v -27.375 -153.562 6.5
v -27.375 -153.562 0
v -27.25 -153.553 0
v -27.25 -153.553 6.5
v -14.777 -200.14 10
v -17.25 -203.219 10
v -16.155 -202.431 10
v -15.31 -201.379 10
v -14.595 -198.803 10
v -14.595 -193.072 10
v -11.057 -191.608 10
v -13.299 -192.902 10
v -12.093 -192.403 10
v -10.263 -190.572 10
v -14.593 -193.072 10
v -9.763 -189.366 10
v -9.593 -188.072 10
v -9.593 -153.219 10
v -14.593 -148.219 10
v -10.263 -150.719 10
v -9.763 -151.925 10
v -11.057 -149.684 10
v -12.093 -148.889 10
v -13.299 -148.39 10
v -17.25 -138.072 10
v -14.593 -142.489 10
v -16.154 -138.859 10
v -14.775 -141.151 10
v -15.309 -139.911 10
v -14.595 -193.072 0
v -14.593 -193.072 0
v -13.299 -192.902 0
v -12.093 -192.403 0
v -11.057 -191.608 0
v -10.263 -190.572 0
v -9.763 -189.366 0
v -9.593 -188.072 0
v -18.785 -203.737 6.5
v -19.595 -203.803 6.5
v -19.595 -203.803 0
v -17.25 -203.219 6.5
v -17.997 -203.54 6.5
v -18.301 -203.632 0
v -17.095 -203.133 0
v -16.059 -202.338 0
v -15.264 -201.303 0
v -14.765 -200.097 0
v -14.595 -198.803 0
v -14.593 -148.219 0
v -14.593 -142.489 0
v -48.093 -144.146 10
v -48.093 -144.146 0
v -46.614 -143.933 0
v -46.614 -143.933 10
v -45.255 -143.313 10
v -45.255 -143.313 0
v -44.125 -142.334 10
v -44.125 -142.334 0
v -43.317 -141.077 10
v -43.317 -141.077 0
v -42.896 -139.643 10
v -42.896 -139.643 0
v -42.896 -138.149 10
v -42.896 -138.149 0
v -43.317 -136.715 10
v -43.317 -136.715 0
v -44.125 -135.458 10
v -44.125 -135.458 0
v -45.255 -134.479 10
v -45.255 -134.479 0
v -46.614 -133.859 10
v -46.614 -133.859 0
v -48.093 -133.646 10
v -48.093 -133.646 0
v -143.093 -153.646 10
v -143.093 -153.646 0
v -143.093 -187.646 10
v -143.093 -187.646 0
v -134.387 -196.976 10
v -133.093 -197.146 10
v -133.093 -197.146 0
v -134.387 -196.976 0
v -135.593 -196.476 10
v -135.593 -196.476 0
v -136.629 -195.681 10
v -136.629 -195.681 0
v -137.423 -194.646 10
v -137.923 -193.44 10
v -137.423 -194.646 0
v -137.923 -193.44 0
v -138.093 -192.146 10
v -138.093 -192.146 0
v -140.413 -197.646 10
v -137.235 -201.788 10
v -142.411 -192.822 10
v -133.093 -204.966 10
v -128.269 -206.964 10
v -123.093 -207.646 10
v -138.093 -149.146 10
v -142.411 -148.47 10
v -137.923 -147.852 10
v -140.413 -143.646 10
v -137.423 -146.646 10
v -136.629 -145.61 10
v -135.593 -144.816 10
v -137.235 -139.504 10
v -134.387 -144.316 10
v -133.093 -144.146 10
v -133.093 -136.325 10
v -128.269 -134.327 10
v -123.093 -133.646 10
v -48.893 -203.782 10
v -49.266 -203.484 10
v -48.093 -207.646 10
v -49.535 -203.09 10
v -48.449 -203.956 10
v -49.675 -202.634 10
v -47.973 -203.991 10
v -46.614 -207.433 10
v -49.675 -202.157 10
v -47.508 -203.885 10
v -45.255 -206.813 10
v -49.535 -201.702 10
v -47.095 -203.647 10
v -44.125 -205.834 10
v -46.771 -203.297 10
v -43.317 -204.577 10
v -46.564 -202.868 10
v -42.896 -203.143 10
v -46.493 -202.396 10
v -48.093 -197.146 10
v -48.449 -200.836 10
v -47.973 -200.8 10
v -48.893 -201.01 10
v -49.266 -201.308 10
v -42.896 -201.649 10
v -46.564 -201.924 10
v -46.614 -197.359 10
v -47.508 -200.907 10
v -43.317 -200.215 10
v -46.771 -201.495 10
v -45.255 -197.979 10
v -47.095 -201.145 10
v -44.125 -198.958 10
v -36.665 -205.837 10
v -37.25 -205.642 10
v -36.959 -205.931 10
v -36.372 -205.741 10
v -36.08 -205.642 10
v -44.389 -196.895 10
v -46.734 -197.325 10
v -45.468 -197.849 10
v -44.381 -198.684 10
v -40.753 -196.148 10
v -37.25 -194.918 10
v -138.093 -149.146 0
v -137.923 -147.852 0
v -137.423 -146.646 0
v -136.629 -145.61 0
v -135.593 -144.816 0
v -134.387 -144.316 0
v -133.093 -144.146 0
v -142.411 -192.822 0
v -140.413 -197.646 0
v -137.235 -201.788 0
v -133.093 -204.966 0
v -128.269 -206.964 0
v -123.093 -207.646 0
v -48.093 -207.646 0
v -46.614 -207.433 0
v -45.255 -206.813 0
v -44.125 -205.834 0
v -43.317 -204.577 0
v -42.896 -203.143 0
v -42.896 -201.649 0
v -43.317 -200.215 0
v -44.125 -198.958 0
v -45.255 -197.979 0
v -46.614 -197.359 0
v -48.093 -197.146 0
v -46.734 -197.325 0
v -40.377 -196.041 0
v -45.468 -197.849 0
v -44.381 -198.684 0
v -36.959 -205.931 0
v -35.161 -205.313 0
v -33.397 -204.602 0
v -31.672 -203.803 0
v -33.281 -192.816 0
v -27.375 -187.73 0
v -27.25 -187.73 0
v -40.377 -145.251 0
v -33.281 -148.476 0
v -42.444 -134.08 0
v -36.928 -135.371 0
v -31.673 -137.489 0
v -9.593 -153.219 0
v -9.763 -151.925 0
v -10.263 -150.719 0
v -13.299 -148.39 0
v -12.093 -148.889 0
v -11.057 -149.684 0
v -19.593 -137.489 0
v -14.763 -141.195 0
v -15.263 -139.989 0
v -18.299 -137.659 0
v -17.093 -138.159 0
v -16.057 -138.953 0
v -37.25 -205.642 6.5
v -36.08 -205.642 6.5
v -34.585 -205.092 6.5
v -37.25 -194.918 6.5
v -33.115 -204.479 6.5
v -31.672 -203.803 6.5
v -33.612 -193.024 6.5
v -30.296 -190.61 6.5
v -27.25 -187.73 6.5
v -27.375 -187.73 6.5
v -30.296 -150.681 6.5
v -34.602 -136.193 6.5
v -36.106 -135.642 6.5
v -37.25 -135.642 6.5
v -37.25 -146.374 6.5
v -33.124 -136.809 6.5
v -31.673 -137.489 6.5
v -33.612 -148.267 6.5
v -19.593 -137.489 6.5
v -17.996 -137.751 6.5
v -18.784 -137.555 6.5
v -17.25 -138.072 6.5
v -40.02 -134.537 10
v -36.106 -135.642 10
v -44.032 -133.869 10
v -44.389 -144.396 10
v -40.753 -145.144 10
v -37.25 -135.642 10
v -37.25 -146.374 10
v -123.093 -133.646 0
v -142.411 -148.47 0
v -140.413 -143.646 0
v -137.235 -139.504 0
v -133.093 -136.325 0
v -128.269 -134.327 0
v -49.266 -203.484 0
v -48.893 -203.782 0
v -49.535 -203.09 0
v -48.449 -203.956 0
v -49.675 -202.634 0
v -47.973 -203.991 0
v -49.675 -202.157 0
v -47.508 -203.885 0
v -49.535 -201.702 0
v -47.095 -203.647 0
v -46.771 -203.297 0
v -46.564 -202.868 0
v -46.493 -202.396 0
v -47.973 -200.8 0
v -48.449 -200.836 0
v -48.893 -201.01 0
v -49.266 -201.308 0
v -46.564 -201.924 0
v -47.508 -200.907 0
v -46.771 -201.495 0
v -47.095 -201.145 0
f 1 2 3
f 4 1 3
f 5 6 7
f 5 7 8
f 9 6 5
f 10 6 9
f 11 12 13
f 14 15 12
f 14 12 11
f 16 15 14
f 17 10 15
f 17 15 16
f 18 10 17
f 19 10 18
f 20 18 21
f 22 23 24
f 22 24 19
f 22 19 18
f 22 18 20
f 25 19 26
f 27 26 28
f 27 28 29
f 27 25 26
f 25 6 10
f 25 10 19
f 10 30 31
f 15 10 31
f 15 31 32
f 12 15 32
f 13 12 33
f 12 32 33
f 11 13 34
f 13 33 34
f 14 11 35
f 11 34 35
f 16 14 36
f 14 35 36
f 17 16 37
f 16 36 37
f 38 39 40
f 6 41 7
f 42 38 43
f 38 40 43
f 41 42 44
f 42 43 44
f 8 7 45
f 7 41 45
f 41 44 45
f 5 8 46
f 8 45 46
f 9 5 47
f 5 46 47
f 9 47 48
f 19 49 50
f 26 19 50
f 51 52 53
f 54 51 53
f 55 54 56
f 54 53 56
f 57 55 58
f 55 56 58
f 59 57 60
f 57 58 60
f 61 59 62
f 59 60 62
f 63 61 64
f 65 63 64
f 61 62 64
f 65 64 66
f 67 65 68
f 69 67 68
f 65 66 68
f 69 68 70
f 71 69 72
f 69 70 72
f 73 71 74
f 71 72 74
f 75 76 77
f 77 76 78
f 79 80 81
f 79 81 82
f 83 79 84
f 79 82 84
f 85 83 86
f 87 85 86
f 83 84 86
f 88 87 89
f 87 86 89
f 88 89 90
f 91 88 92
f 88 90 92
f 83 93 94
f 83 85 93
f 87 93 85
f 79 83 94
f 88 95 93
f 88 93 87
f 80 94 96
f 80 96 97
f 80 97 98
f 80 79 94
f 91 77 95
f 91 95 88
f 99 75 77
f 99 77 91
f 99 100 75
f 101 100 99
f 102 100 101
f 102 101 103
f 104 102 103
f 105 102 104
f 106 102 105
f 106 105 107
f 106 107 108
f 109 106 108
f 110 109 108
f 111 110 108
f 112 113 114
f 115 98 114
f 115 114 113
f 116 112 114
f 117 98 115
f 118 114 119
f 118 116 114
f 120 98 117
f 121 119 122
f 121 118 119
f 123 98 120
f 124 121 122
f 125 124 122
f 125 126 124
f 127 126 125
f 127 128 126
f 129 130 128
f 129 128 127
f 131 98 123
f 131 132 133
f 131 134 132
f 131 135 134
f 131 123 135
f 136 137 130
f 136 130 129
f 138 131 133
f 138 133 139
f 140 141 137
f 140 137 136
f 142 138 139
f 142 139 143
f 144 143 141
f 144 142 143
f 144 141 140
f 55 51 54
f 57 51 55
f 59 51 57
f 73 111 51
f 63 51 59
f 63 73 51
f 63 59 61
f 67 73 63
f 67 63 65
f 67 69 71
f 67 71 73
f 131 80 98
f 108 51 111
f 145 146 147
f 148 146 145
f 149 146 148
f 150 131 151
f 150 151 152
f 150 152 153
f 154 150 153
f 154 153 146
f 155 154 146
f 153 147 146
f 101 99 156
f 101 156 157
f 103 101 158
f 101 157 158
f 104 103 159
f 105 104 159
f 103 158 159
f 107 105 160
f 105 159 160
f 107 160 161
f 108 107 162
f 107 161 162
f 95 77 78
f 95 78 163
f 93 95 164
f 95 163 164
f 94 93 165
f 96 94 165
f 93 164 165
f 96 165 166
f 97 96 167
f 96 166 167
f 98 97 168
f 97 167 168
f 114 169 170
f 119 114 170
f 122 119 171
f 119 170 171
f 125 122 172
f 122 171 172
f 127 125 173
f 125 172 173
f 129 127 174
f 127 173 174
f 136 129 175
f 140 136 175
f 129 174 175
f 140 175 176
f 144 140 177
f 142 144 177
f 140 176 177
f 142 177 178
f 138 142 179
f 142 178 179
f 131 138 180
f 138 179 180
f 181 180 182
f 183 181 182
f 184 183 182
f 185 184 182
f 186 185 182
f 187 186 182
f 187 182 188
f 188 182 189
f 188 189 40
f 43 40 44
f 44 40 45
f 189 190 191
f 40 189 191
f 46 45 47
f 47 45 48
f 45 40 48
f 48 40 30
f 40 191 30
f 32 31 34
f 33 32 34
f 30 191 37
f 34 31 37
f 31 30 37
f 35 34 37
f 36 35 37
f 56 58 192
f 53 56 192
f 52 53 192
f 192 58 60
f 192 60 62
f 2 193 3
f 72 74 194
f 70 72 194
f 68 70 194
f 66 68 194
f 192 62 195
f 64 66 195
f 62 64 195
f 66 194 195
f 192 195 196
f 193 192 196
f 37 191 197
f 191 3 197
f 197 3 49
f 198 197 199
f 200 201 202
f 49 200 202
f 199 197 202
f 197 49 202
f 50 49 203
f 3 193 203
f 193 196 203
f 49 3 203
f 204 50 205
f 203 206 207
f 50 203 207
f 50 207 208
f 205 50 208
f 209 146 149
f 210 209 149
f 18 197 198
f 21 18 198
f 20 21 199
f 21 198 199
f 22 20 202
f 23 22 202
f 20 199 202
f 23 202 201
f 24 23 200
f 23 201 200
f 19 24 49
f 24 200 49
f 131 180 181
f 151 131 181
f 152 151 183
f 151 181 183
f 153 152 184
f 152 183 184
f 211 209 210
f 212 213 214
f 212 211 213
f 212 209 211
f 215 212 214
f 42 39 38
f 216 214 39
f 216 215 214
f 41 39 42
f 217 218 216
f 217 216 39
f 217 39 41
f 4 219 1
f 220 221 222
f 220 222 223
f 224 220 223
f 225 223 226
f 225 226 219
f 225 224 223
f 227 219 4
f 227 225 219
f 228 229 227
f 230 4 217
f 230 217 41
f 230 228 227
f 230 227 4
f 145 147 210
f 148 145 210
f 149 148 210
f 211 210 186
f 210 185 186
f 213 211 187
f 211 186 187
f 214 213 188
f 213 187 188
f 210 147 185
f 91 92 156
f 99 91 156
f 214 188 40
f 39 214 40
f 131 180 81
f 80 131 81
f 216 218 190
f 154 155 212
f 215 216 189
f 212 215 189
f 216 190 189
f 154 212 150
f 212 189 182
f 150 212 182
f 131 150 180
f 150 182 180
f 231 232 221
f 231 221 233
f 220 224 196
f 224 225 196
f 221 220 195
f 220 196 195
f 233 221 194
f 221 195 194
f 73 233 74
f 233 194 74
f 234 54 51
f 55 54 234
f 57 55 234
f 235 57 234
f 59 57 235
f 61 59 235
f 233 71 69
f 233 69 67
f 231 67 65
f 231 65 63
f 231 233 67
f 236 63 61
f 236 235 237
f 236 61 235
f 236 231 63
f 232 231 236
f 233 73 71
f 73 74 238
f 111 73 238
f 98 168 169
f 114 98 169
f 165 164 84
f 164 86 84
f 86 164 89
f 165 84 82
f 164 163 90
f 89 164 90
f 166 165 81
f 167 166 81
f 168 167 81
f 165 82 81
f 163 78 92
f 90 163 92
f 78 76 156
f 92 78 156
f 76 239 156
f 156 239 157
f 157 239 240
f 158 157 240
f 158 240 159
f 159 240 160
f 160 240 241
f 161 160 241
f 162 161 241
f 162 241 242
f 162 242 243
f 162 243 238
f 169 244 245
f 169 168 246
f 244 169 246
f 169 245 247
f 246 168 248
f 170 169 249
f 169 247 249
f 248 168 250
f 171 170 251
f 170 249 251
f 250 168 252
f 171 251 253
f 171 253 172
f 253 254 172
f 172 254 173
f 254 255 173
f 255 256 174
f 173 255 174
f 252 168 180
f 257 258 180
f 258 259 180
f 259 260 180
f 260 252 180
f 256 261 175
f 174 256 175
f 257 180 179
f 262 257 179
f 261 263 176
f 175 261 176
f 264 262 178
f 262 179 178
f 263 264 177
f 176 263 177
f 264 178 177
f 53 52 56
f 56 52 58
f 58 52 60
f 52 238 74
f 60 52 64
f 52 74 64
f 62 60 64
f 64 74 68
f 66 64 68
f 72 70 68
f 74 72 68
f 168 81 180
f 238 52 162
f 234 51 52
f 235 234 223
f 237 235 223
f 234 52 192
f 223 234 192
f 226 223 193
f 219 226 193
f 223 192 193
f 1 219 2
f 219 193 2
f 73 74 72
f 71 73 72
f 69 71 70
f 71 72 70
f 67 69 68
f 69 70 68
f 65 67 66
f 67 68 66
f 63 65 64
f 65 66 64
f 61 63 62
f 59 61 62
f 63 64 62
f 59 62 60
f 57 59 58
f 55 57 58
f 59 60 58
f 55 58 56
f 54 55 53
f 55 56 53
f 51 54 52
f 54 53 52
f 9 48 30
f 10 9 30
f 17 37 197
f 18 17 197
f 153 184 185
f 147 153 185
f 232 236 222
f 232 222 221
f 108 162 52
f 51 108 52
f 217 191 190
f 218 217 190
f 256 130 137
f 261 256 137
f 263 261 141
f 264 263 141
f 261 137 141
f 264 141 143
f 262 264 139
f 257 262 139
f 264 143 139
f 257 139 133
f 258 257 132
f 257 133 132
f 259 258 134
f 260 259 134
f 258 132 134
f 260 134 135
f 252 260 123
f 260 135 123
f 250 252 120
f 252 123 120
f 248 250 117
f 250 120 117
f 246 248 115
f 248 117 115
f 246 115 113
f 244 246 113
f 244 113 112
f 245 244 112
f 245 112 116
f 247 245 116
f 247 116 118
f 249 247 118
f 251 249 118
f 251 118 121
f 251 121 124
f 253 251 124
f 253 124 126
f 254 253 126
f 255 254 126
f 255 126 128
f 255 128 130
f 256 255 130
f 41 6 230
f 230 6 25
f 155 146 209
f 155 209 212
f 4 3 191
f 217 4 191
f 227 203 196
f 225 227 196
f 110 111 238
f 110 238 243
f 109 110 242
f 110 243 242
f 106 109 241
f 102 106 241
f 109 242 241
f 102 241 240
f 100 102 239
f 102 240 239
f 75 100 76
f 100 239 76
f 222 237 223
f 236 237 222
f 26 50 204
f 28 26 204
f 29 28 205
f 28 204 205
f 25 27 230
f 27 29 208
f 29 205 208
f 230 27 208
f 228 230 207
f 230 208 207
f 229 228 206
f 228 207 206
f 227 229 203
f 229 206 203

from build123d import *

# Parameters (mm, degrees)
BOSS_EXTRUDE1_DEPTH = 10
BOSS_EXTRUDE2_DEPTH = 10
SKETCH2_W           = 20
SKETCH2_H           = 70
CUT_EXTRUDE1_DEPTH  = 3.5
SKETCH3_R           = 1.6
CUT_EXTRUDE2_DEPTH  = 253.373599124


# Read off the part's stored shape, not the designer's step: Boss-Extrude2
with BuildPart() as part:
    # Sketch1 → Boss-Extrude1 (new body)
    with BuildSketch(Plane.XY):
        with BuildLine():
            Line((-143.092977135, -153.645932851), (-143.092977135, -187.645932851))
            ThreePointArc((-143.092977135, -187.645932851), (-137.235112759, -201.788068475), (-123.092977135, -207.645932851))
            Line((-123.092977135, -207.645932851), (-48.092977135, -207.645932851))
            ThreePointArc((-48.092977135, -207.645932851), (-42.842977135, -202.395932851), (-48.092977135, -197.145932851))
            Line((-48.092977135, -197.145932851), (-133.092977135, -197.145932851))
            ThreePointArc((-133.092977135, -197.145932851), (-136.628511041, -195.681466757), (-138.092977135, -192.145932851))
            Line((-138.092977135, -192.145932851), (-138.092977135, -149.145932851))
            ThreePointArc((-138.092977135, -149.145932851), (-136.628511041, -145.610398945), (-133.092977135, -144.145932851))
            Line((-133.092977135, -144.145932851), (-48.092977135, -144.145932851))
            ThreePointArc((-48.092977135, -144.145932851), (-42.842977135, -138.895932851), (-48.092977135, -133.645932851))
            Line((-48.092977135, -133.645932851), (-123.092977135, -133.645932851))
            ThreePointArc((-123.092977135, -133.645932851), (-137.235112759, -139.503797227), (-143.092977135, -153.645932851))
        make_face()
    extrude(amount=BOSS_EXTRUDE1_DEPTH)

    # Sketch3 → Cut-Extrude2 (cut, through all)
    with BuildSketch(Plane.XY.offset(10)):
        with Locations((-48.092977135, -202.395935058)):
            Circle(SKETCH3_R)
    extrude(amount=-CUT_EXTRUDE2_DEPTH, mode=Mode.SUBTRACT)


with BuildPart() as body_2:
    # Boss-Extrude2 outline → Boss-Extrude2 (new body)
    with BuildSketch(Plane.XY):
        with BuildLine():
            ThreePointArc((-19.594596165, -203.80263398), (-16.059062259, -202.338167886), (-14.594596165, -198.80263398))
            Line((-14.594596165, -198.80263398), (-14.594596165, -193.072403439))
            Line((-14.594596165, -193.072403439), (-14.592977135, -193.072403439))
            ThreePointArc((-14.592977135, -193.072403439), (-11.057443229, -191.607937345), (-9.592977135, -188.072403439))
            Line((-9.592977135, -188.072403439), (-9.592977135, -153.219462263))
            ThreePointArc((-9.592977135, -153.219462263), (-11.05744323, -149.683928358), (-14.592977135, -148.219462263))
            Line((-14.592977135, -148.219462263), (-14.592977135, -142.488886754))
            ThreePointArc((-14.592977135, -142.488886754), (-16.05744323, -138.953352849), (-19.592977135, -137.488886754))
            Line((-19.592977135, -137.488886754), (-31.673163065, -137.488886754))
            ThreePointArc((-31.673163065, -137.488886754), (-39.661212954, -134.619479337), (-48.092977135, -133.645932851))
            ThreePointArc((-48.092977135, -133.645932851), (-42.842977135, -138.895932851), (-48.092977135, -144.145932851))
            ThreePointArc((-48.092977135, -144.145932851), (-36.714532919, -146.610338046), (-27.375441215, -153.561859599))
            Line((-27.375441215, -153.561859599), (-27.250412325, -153.553105763))
            Line((-27.250412325, -153.553105763), (-27.250412325, -187.730006103))
            Line((-27.250412325, -187.730006103), (-27.375441215, -187.730006103))
            ThreePointArc((-27.375441215, -187.730006103), (-36.714532919, -194.681527655), (-48.092977135, -197.145932851))
            ThreePointArc((-48.092977135, -197.145932851), (-46.083888931, -197.545565381), (-44.380666253, -198.683622531))
            Line((-44.380666253, -198.683622531), (-36.959303905, -205.931076013))
            ThreePointArc((-36.959303905, -205.931076013), (-34.274842822, -204.968799513), (-31.672465962, -203.80263398))
            Line((-31.672465962, -203.80263398), (-19.594596165, -203.80263398))
        make_face()
    extrude(amount=BOSS_EXTRUDE2_DEPTH)

    # Sketch2 → Cut-Extrude1 (cut)
    with BuildSketch(Plane.XY.offset(10)):
        with Locations((-27.250412325, -170.641555933)):
            Rectangle(SKETCH2_W, SKETCH2_H)
    extrude(amount=-CUT_EXTRUDE1_DEPTH, mode=Mode.SUBTRACT)


solid = Compound([part.part, body_2.part])
